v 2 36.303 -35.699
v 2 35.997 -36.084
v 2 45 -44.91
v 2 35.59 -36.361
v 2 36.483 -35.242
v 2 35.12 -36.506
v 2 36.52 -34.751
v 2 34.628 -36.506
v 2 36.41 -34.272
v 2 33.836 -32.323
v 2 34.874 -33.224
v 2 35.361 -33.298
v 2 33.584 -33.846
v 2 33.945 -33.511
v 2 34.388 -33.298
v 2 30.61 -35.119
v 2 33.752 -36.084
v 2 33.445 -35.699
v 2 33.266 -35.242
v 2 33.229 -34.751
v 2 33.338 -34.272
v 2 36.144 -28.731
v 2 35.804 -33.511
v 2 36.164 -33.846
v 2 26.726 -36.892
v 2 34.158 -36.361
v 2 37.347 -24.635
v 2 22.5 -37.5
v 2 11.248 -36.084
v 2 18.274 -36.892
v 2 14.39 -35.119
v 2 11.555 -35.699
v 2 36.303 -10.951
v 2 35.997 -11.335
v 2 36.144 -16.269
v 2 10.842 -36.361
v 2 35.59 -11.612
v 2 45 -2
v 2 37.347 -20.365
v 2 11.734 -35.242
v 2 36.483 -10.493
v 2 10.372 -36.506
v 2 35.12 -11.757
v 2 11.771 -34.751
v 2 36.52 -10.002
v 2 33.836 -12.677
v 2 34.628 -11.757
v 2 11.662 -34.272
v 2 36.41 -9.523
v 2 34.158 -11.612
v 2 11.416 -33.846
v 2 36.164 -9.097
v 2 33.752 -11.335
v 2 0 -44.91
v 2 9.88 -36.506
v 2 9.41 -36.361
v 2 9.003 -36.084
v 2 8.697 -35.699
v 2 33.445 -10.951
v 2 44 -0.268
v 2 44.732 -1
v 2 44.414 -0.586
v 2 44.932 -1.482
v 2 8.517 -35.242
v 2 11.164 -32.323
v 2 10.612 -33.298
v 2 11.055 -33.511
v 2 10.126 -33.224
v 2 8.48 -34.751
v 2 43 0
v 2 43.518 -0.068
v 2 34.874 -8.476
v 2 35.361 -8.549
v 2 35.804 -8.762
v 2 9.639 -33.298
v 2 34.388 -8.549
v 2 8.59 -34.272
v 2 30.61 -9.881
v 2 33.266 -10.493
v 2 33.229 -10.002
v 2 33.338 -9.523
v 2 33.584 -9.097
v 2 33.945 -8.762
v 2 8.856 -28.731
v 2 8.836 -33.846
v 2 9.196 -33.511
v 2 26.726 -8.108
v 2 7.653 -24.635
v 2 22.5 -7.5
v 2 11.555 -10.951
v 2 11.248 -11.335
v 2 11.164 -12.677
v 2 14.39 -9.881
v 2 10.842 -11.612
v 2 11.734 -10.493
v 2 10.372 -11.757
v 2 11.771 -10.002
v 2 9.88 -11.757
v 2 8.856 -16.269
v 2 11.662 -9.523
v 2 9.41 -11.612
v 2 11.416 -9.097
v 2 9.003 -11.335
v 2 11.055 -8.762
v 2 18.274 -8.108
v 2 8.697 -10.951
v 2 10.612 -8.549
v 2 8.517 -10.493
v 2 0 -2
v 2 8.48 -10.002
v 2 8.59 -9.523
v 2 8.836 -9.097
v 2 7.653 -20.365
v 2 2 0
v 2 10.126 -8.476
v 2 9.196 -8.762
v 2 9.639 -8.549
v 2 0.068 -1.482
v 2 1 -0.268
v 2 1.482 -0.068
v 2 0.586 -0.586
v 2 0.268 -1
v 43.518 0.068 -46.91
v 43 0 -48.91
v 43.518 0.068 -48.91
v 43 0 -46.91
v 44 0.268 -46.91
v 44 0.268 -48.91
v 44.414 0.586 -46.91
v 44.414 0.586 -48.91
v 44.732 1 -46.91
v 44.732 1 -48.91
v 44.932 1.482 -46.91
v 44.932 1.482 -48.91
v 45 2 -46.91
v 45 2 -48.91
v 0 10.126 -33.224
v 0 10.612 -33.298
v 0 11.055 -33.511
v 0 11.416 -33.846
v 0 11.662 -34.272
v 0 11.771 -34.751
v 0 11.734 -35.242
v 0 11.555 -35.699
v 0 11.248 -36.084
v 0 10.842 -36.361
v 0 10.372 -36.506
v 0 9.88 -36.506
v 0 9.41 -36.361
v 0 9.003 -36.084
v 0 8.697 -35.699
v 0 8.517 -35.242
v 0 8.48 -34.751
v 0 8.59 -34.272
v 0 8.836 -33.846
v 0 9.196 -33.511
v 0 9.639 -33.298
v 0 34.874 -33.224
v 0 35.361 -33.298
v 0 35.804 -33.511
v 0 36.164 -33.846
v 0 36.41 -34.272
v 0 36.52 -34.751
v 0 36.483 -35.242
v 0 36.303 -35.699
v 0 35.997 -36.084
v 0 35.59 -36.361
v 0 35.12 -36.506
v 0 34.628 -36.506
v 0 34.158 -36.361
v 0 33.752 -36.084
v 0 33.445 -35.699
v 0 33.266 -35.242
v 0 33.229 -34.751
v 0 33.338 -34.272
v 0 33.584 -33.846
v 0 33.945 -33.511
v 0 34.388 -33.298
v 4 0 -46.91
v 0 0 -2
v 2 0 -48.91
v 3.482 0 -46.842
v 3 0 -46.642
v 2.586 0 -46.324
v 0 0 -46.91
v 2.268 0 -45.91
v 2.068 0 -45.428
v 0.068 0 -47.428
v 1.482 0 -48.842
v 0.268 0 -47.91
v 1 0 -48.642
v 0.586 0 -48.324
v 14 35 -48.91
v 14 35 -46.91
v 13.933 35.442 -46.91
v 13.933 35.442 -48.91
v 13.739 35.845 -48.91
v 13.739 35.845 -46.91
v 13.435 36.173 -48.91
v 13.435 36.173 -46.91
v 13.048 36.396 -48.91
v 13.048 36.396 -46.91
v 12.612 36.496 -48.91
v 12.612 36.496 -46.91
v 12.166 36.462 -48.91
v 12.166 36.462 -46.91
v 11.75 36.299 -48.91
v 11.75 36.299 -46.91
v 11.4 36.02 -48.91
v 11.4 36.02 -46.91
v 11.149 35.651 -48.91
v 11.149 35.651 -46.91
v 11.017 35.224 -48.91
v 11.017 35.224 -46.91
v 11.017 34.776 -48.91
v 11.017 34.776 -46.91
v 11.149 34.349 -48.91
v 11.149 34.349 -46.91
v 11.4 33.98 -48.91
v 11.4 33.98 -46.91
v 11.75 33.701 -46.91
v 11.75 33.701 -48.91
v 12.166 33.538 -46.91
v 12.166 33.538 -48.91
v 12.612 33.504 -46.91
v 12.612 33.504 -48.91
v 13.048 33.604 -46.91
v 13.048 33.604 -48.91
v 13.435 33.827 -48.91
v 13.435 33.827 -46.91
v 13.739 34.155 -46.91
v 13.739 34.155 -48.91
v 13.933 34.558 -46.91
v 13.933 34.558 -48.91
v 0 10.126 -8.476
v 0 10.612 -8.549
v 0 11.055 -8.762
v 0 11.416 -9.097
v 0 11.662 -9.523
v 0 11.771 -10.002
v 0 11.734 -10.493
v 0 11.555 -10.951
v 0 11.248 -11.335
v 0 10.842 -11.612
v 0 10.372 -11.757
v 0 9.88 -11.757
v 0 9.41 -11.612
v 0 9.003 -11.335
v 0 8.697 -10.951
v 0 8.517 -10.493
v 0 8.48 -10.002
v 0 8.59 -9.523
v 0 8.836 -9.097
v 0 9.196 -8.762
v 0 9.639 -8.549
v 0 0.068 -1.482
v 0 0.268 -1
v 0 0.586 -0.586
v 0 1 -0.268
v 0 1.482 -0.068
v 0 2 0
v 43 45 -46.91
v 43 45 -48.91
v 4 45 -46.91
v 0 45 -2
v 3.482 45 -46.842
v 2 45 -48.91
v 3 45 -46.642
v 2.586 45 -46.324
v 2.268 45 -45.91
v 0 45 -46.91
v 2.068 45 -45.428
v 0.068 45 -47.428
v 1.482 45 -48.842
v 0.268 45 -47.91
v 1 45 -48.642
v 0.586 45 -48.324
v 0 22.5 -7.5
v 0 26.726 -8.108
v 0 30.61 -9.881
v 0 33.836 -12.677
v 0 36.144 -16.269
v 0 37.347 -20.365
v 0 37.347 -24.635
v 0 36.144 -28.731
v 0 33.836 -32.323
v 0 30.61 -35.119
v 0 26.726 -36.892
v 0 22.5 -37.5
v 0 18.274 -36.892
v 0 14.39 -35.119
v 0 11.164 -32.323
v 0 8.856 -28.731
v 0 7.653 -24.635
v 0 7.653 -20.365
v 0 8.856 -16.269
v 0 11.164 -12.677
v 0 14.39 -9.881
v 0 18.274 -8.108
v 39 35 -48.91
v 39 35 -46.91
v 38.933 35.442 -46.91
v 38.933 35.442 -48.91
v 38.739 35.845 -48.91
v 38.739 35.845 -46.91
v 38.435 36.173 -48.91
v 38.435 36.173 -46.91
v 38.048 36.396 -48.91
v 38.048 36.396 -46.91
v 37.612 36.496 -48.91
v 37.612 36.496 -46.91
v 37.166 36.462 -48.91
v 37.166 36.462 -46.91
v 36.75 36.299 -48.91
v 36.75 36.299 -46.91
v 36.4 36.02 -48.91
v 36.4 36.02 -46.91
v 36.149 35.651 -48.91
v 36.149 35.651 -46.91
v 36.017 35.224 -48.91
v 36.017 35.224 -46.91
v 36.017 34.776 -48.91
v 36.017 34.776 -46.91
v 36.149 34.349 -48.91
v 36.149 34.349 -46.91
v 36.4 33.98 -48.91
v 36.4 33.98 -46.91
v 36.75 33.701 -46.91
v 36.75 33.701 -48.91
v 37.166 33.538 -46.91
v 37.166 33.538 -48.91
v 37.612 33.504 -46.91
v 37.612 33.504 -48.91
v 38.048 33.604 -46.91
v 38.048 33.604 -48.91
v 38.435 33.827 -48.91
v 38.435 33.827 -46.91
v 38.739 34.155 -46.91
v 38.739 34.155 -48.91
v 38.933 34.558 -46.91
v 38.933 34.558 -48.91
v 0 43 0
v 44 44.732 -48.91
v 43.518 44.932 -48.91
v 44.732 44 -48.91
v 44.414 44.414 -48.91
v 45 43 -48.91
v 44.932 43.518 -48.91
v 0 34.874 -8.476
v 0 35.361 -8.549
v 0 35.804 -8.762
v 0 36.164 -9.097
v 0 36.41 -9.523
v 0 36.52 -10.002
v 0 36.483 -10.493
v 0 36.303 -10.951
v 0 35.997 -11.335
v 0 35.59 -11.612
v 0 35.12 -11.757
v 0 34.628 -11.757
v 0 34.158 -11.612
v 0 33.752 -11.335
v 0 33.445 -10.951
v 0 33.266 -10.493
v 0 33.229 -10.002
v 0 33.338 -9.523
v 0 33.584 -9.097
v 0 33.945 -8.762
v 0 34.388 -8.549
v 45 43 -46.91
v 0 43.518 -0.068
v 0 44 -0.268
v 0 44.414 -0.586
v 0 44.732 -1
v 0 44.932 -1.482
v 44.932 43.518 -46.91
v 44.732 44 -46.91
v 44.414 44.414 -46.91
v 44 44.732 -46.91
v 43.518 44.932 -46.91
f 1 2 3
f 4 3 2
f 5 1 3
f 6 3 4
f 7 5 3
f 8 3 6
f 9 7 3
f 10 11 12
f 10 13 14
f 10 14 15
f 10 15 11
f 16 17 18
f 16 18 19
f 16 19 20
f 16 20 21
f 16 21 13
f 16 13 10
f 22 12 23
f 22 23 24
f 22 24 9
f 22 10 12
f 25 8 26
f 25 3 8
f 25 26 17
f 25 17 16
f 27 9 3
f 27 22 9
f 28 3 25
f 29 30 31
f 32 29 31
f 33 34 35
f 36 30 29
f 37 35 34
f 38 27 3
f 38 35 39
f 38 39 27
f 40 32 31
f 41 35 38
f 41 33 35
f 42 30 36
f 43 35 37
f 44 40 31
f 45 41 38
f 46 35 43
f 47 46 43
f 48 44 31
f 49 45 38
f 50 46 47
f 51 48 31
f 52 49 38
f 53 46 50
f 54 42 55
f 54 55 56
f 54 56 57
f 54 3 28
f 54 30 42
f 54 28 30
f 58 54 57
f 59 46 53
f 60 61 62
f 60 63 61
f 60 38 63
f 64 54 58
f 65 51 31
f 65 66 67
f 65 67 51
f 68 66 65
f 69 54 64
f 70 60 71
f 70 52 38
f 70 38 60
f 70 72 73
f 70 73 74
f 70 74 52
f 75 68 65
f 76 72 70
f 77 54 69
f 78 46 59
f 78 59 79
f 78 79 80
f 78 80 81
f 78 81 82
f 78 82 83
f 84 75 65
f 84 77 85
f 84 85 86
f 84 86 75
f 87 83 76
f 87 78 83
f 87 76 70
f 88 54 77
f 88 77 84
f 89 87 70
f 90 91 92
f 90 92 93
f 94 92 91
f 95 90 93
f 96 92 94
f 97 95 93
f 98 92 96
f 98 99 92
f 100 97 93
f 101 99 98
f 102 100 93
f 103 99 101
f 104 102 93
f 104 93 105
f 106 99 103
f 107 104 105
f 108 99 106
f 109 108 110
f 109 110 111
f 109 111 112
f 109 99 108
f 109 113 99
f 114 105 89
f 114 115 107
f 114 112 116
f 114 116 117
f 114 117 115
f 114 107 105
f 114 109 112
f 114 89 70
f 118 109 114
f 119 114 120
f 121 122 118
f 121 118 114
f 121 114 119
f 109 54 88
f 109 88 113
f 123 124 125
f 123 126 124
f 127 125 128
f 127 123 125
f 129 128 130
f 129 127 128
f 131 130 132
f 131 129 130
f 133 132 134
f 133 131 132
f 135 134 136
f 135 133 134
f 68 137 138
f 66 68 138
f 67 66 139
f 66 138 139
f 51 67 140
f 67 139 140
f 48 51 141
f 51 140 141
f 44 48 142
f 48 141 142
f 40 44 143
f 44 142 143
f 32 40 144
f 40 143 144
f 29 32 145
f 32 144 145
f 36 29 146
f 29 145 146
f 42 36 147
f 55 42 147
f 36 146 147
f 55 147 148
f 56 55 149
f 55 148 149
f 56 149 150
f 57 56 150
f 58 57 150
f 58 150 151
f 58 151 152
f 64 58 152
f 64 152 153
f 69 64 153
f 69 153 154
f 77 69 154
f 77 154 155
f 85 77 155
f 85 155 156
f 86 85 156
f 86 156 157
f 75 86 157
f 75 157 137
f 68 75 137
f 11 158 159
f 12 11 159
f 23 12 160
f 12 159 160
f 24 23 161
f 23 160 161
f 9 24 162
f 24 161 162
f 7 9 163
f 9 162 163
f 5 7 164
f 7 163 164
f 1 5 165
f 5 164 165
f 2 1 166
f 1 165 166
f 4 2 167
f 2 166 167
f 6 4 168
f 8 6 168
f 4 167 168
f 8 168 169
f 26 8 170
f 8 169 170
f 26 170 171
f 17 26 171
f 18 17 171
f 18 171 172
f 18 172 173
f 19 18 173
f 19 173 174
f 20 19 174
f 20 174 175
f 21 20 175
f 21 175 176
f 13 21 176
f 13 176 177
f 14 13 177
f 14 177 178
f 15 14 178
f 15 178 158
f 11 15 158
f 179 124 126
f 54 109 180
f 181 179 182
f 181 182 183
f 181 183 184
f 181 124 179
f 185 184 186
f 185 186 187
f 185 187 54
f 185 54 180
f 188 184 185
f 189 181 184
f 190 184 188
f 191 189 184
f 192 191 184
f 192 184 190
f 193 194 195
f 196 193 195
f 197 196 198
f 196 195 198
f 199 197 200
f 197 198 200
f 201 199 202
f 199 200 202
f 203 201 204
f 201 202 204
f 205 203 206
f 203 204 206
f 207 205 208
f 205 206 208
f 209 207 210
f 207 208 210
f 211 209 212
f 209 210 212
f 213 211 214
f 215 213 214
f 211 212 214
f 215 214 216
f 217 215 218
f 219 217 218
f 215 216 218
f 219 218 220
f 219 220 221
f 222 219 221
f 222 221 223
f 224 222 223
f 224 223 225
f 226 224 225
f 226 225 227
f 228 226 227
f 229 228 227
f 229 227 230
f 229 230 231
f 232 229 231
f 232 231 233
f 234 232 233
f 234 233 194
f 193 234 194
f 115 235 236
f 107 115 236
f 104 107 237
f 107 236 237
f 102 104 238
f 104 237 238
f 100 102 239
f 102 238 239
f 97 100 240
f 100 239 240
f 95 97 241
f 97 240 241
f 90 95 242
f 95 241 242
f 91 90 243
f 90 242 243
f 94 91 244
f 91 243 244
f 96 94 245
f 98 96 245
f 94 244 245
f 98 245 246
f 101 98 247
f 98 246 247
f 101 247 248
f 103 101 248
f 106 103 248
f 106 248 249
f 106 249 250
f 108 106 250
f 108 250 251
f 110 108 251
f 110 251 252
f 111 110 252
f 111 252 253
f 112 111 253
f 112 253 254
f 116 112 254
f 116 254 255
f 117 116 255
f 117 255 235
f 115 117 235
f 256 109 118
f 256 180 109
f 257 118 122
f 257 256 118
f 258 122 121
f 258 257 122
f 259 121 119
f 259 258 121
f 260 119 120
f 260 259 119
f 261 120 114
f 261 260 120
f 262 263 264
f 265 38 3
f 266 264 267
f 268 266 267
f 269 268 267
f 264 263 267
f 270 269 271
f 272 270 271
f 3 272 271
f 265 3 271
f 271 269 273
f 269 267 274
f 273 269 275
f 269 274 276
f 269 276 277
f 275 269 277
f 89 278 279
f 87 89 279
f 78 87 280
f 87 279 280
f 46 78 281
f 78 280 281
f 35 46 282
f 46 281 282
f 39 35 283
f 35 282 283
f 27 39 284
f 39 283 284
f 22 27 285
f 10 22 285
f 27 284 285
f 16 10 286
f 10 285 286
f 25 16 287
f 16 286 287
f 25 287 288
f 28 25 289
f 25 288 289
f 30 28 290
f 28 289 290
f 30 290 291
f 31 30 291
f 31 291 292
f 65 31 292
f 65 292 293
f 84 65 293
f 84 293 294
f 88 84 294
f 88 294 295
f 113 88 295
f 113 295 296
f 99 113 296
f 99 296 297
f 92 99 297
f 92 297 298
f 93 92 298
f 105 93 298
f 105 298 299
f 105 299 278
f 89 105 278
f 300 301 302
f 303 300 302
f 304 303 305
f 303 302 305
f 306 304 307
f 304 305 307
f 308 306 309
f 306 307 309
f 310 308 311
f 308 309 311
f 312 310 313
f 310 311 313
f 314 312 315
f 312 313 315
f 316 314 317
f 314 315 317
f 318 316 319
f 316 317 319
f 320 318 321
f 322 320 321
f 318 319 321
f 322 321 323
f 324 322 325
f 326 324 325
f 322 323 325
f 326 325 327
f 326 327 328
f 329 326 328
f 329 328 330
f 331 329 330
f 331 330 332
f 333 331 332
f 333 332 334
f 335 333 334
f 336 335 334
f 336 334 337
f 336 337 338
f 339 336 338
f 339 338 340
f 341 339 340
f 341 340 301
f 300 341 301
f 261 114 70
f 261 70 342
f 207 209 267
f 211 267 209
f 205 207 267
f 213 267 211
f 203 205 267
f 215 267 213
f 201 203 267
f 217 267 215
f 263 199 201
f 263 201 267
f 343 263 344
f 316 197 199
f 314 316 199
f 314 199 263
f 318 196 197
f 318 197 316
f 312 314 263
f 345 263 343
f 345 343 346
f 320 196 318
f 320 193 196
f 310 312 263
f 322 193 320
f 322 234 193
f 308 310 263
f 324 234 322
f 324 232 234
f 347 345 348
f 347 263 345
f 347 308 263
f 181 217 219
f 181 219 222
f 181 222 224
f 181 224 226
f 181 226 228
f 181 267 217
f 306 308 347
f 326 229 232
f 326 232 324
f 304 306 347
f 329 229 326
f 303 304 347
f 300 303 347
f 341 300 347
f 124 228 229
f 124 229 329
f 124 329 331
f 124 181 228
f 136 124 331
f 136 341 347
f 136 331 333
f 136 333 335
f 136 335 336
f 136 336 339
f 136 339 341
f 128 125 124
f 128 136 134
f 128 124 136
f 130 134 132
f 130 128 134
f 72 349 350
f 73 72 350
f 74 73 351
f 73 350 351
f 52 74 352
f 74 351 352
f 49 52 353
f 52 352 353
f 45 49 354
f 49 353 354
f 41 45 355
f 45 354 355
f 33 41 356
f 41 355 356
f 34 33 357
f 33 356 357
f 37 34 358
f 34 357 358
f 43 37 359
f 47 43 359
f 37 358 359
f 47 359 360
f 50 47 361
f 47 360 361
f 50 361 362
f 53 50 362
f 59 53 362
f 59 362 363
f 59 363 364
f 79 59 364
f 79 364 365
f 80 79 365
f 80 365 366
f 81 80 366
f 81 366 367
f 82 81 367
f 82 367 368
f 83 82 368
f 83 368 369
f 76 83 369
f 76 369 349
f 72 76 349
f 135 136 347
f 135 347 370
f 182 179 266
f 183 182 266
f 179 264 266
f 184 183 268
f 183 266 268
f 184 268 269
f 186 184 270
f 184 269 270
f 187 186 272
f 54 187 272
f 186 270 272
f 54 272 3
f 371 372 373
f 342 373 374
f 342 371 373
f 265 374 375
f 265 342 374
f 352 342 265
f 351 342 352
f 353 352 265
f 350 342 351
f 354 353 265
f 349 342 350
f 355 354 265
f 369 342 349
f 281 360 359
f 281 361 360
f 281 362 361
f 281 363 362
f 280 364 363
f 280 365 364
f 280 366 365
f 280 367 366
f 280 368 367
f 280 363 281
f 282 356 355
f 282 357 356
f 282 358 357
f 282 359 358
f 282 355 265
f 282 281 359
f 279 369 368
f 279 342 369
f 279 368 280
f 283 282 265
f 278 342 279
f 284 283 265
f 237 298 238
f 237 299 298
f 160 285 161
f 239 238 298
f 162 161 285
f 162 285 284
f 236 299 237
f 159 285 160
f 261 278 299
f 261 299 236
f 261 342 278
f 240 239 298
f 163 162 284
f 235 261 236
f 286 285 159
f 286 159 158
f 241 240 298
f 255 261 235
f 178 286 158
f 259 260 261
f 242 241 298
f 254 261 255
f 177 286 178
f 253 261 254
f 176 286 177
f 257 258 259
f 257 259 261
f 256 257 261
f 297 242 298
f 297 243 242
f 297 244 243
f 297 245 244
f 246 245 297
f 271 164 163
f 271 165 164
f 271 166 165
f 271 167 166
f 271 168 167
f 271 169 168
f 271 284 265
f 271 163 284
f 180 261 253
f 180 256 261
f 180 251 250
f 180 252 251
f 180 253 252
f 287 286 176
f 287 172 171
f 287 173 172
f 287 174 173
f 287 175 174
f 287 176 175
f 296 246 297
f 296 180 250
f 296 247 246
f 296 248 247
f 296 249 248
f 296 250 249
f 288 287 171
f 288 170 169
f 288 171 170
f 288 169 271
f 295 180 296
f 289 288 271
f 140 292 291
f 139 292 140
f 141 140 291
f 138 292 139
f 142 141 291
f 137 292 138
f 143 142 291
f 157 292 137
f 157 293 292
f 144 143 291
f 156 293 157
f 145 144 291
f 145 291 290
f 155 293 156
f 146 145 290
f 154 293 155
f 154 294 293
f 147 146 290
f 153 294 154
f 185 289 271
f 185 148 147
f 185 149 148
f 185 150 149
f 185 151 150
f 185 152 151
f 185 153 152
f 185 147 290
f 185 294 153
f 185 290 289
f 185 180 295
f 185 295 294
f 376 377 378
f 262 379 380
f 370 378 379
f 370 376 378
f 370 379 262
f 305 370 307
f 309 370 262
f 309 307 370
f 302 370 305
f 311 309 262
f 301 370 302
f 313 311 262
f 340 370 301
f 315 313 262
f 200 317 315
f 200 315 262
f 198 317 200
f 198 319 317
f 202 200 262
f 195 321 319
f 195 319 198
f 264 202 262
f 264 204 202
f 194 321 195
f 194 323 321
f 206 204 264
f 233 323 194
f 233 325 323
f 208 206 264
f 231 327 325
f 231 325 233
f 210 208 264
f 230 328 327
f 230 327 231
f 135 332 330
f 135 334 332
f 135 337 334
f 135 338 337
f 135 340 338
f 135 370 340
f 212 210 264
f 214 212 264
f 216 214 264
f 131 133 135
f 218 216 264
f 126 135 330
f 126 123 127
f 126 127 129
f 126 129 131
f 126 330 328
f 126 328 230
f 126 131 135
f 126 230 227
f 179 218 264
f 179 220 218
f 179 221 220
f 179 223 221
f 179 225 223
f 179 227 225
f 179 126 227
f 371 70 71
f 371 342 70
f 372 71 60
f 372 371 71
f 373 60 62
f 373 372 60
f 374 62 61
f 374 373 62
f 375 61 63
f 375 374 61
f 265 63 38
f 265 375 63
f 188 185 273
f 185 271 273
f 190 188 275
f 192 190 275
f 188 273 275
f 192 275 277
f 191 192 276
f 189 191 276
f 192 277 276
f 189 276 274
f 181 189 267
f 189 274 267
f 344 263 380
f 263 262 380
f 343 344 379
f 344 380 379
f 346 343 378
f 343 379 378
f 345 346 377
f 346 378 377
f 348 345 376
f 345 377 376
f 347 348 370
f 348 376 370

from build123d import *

# Parameters (mm, degrees)
EXTRUDE_1_DEPTH     = 45
FILLET_1_R          = 2
SKETCH_2_R          = 15
CUT_EXTRUDE_1_DEPTH = 10
FILLET_2_R          = 2
SKETCH_4_R          = 1.65
CUT_EXTRUDE_2_DEPTH = 10
SKETCH_5_R          = 1.5
CUT_EXTRUDE_3_DEPTH = 10


with BuildPart() as part:
    # 草图1 → 拉伸-薄壁1 (new body)
    with BuildSketch(Plane(origin=(0, 0, 0), x_dir=(1, 0, 0), z_dir=(0, 1, 0))):
        Polygon((0, 0), (0, 48.91), (45, 48.91), (45, 46.91), (2, 46.91), (2, 0), align=None)
    extrude(amount=EXTRUDE_1_DEPTH)

    # 圆角1
    fillet_1_edges = [part.edges().sort_by_distance(p)[0] for p in [
        (2, 22.5, -46.91),
        (0, 22.5, -48.91),
    ]]
    fillet(fillet_1_edges, radius=FILLET_1_R)

    # 草图2 → 切除-拉伸1 (cut)
    with BuildSketch(Plane.ZY):
        with Locations((-22.5, 22.5)):
            Circle(SKETCH_2_R)
    extrude(amount=-CUT_EXTRUDE_1_DEPTH, mode=Mode.SUBTRACT)

    # 圆角2
    fillet_2_edges = [part.edges().sort_by_distance(p)[0] for p in [
        (1, 45, 0),
        (1, 0, 0),
        (45, 0, -47.91),
        (45, 45, -47.91),
    ]]
    fillet(fillet_2_edges, radius=FILLET_2_R)

    # 草图4 → 切除-拉伸2 (cut)
    with BuildSketch(Plane.ZY):
        with Locations((-34.874368671, 10.125631329)):
            Circle(SKETCH_4_R)
        with Locations((-10.125631329, 10.125631329)):
            Circle(SKETCH_4_R)
        with Locations((-10.125631329, 34.874368671)):
            Circle(SKETCH_4_R)
        with Locations((-34.874368671, 34.874368671)):
            Circle(SKETCH_4_R)
    extrude(amount=-CUT_EXTRUDE_2_DEPTH, mode=Mode.SUBTRACT)

    # 草图5 → 切除-拉伸3 (cut)
    with BuildSketch(Plane.XY.offset(-46.91)):
        with Locations((12.5, 35)):
            Circle(SKETCH_5_R)
        with Locations((37.5, 35)):
            Circle(SKETCH_5_R)
    extrude(amount=-CUT_EXTRUDE_3_DEPTH, mode=Mode.SUBTRACT)


solid = part.part
